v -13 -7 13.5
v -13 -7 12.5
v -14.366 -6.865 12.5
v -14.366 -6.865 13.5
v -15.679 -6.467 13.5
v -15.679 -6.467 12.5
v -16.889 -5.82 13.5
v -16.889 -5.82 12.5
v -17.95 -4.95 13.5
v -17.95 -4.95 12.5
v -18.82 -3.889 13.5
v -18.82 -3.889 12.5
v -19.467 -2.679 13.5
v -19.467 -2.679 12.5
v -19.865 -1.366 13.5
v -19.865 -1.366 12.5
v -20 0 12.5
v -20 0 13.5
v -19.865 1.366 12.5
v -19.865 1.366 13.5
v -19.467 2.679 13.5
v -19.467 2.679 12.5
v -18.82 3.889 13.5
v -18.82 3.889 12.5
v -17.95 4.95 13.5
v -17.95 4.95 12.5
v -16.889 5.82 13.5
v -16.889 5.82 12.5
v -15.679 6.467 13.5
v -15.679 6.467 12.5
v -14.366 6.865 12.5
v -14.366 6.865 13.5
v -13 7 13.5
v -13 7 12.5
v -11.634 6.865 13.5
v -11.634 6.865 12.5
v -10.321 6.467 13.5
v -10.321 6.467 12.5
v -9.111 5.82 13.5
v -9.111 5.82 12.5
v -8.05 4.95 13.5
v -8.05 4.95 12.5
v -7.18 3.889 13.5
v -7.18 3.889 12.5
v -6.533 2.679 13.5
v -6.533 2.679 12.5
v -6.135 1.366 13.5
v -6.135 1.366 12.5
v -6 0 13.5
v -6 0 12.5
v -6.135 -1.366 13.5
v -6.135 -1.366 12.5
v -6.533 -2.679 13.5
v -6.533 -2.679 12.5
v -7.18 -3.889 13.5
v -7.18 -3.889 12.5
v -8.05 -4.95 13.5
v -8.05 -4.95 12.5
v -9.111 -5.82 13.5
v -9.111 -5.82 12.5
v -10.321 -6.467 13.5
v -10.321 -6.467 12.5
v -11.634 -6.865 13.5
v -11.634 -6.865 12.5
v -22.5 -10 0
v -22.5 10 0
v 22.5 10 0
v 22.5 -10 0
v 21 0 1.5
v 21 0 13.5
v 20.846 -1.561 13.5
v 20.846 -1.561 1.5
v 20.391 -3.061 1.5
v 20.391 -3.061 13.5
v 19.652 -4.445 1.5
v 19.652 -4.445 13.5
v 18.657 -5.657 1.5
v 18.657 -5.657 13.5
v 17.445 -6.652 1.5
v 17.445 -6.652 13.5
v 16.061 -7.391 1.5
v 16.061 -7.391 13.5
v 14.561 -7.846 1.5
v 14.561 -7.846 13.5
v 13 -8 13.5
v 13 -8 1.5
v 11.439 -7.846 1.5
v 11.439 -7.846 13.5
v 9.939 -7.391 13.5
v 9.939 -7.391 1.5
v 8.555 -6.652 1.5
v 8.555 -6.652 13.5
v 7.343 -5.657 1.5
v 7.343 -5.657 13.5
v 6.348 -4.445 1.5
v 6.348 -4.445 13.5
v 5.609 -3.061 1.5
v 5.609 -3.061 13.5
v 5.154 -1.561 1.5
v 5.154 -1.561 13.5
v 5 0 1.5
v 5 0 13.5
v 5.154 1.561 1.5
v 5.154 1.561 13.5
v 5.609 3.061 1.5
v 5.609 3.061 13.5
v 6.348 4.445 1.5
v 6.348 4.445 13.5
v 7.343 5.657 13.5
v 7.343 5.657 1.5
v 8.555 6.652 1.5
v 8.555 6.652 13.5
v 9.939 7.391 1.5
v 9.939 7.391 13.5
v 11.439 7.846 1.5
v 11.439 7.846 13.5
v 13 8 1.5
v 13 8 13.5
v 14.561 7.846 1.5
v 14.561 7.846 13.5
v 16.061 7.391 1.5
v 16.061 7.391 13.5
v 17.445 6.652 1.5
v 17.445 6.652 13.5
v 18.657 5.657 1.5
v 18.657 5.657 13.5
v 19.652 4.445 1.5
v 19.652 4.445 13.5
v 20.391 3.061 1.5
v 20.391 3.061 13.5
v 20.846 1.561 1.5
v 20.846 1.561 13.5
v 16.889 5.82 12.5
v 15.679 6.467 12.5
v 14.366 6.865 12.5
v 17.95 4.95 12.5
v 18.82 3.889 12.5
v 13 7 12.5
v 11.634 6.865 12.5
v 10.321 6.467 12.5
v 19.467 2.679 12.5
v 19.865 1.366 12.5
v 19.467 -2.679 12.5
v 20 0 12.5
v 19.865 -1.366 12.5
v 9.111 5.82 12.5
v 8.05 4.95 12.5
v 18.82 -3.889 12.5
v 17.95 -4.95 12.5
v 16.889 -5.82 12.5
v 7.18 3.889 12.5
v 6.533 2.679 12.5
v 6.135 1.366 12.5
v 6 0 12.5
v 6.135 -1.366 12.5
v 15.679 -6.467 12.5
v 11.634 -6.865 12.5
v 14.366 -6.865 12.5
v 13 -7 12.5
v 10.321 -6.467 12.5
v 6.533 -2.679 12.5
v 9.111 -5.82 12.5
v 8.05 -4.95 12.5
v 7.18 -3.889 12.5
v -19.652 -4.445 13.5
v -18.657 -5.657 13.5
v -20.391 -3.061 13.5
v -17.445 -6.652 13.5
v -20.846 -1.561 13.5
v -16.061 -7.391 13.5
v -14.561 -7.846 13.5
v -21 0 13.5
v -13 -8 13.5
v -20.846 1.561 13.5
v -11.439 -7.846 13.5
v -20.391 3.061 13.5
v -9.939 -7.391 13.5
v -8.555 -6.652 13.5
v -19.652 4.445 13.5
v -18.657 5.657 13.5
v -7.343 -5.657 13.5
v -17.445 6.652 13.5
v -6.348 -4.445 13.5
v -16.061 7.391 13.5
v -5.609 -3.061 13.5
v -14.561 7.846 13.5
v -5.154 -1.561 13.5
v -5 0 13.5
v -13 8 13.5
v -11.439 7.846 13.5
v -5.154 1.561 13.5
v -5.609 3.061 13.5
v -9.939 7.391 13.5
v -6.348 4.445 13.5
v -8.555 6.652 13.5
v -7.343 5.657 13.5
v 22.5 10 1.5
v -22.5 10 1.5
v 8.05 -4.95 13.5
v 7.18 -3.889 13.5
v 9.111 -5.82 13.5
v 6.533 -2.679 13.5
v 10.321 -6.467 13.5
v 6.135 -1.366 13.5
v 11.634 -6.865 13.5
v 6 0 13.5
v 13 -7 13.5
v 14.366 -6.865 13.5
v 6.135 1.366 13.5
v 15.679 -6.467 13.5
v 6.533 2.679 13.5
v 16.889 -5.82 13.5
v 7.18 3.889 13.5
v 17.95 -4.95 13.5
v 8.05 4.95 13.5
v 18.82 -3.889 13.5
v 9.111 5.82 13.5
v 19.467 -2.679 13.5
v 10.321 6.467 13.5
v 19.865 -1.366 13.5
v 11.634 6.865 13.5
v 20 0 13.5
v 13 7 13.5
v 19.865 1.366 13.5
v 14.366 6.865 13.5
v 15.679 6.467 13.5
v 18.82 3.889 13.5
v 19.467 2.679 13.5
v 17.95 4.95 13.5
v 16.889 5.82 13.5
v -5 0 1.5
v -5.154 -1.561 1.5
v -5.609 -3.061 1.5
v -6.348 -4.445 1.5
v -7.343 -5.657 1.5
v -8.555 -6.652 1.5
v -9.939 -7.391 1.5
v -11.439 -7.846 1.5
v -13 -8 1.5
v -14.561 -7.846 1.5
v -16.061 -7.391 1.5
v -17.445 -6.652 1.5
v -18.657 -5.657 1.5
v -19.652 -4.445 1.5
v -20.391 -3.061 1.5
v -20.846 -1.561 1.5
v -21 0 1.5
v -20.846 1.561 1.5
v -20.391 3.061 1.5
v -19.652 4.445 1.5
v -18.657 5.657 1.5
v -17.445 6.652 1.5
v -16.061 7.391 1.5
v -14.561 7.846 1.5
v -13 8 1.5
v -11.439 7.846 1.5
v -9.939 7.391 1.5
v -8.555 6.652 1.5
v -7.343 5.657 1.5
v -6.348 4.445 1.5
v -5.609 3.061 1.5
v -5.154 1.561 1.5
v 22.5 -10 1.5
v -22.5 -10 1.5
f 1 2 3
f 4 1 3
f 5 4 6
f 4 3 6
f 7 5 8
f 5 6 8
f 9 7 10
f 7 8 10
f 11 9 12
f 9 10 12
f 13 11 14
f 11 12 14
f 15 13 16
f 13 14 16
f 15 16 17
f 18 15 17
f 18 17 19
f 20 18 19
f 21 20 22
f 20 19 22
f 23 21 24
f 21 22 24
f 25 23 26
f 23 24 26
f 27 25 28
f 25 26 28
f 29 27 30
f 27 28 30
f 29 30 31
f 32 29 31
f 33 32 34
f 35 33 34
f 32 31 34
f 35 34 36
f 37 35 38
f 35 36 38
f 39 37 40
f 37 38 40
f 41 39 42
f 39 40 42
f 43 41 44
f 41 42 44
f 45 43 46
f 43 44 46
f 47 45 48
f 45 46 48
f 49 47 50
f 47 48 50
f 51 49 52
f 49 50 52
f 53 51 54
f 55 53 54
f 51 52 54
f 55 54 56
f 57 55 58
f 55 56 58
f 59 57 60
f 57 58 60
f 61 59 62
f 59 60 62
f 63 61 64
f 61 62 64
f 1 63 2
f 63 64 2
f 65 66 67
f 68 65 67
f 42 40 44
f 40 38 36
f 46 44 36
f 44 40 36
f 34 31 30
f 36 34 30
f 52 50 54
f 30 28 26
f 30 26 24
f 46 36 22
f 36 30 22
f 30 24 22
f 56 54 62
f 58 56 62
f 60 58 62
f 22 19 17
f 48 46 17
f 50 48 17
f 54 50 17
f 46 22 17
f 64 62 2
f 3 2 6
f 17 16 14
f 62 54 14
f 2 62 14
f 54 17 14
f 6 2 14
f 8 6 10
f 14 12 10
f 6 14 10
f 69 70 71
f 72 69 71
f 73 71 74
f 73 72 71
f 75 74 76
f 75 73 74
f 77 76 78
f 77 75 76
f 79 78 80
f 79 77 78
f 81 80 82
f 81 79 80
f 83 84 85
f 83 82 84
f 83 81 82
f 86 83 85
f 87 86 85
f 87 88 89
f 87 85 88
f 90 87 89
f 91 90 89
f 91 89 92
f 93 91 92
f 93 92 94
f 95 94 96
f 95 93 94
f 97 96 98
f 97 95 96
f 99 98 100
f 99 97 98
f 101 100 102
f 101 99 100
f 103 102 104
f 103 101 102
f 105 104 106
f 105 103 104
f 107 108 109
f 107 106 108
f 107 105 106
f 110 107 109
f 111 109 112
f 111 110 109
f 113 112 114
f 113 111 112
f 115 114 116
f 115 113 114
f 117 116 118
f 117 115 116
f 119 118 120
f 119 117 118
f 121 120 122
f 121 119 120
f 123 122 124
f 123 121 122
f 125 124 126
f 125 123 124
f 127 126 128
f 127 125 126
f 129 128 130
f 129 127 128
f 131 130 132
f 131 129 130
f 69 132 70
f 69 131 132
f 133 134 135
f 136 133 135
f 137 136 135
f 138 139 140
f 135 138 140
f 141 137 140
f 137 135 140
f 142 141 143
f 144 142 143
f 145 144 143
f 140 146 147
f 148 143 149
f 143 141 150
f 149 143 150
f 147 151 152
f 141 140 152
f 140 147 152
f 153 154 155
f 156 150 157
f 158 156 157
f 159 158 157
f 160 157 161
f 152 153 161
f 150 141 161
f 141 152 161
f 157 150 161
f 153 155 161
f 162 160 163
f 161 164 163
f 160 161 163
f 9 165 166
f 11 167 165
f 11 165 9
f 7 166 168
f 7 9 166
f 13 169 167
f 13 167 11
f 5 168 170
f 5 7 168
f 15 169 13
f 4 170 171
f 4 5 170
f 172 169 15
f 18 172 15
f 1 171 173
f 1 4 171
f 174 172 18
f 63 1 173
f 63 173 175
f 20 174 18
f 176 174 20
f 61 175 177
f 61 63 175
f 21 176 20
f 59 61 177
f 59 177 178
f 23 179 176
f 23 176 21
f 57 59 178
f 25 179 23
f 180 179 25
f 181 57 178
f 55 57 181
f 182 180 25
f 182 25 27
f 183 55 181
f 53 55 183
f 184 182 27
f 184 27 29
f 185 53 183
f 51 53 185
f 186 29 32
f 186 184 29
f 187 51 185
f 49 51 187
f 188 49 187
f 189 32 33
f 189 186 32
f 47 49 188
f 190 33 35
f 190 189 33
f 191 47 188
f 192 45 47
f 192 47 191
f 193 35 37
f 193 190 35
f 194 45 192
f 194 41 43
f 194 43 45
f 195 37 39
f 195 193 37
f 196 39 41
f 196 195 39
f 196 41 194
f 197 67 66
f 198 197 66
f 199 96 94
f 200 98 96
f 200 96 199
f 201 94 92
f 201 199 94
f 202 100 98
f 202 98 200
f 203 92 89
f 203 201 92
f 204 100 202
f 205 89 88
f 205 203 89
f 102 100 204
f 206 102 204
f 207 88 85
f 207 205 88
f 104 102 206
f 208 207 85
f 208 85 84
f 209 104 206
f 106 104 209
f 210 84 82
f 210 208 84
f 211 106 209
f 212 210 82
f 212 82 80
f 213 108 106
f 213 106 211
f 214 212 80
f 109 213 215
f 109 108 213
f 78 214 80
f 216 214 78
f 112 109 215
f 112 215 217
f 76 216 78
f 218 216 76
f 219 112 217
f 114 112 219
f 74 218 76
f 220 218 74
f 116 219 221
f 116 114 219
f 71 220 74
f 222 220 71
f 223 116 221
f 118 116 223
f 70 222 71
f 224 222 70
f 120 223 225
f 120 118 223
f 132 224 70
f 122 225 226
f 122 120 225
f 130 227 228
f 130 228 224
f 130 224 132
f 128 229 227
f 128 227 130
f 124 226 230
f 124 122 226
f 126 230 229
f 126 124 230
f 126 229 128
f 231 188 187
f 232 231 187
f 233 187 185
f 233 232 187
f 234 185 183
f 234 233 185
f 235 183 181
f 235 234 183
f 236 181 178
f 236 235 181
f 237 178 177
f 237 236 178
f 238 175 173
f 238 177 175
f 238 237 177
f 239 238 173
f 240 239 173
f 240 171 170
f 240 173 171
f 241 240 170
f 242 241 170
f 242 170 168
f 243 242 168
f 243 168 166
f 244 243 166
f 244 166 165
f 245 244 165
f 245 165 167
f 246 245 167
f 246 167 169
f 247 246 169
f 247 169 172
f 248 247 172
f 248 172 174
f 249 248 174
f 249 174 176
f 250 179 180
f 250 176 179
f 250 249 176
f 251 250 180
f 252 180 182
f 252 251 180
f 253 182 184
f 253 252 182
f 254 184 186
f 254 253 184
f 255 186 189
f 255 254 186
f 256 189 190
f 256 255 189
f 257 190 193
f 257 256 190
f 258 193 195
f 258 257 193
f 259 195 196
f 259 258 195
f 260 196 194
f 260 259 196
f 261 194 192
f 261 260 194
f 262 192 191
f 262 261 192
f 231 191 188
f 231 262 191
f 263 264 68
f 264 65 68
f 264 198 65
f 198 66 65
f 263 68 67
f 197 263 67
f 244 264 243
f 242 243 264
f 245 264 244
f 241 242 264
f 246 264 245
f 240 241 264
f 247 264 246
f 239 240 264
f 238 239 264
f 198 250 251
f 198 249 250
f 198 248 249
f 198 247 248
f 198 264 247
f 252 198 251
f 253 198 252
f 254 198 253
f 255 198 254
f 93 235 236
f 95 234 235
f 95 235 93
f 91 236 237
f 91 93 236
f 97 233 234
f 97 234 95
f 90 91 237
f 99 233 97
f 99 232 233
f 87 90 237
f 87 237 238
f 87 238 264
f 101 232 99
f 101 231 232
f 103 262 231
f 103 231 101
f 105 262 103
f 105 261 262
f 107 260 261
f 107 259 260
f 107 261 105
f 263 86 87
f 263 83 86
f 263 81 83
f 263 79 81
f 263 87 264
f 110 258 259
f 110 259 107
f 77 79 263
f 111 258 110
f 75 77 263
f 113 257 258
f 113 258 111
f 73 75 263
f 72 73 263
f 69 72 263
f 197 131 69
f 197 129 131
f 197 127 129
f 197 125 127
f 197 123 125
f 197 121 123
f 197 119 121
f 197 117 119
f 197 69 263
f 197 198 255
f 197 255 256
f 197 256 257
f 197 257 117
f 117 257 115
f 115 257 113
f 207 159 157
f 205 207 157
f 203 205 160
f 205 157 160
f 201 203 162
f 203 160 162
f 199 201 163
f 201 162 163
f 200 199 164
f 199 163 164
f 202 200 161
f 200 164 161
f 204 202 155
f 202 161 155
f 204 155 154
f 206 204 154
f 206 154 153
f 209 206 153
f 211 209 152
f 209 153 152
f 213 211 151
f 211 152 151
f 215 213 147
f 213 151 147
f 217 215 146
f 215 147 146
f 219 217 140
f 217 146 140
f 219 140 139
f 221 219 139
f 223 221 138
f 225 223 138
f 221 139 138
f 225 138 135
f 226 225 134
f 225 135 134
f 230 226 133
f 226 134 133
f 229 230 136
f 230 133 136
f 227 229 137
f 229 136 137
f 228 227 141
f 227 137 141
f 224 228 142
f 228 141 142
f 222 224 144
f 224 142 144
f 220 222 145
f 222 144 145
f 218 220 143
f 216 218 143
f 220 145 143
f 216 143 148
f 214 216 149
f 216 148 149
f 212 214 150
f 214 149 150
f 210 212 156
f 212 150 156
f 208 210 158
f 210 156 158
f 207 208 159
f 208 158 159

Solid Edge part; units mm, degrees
sketch "Sketch1" plane through (0, 0, 0) normal (0, 0, 1) x (1, 0, 0)
  line L0 (-22.5, -10) -> (22.5, -10)
  line L1 (22.5, -10) -> (22.5, 10)
  line L2 (22.5, 10) -> (-22.5, 10)
  line L3 (-22.5, 10) -> (-22.5, -10)
extrude "Protrusion1" add sketch "Sketch1" along normal blind 1.5
sketch "Sketch2" plane through (0, 0, 1.5) normal (0, 0, 1) x (1, 0, 0)
  circle A0 centre (-13, 0) radius 8
  circle A1 centre (13, 0) radius 8
  dimension "D1" = 26
  dimension "D2" = 9.5
extrude "ultrasone" add sketch "Sketch2" along normal blind 12
hole "Hole_1" at (-13, 0, 13.5) direction (0, 0, -1) diameter 14 depth 1
hole "Hole1" at (13, 0, 13.5) direction (0, 0, -1) diameter 14 depth 1
